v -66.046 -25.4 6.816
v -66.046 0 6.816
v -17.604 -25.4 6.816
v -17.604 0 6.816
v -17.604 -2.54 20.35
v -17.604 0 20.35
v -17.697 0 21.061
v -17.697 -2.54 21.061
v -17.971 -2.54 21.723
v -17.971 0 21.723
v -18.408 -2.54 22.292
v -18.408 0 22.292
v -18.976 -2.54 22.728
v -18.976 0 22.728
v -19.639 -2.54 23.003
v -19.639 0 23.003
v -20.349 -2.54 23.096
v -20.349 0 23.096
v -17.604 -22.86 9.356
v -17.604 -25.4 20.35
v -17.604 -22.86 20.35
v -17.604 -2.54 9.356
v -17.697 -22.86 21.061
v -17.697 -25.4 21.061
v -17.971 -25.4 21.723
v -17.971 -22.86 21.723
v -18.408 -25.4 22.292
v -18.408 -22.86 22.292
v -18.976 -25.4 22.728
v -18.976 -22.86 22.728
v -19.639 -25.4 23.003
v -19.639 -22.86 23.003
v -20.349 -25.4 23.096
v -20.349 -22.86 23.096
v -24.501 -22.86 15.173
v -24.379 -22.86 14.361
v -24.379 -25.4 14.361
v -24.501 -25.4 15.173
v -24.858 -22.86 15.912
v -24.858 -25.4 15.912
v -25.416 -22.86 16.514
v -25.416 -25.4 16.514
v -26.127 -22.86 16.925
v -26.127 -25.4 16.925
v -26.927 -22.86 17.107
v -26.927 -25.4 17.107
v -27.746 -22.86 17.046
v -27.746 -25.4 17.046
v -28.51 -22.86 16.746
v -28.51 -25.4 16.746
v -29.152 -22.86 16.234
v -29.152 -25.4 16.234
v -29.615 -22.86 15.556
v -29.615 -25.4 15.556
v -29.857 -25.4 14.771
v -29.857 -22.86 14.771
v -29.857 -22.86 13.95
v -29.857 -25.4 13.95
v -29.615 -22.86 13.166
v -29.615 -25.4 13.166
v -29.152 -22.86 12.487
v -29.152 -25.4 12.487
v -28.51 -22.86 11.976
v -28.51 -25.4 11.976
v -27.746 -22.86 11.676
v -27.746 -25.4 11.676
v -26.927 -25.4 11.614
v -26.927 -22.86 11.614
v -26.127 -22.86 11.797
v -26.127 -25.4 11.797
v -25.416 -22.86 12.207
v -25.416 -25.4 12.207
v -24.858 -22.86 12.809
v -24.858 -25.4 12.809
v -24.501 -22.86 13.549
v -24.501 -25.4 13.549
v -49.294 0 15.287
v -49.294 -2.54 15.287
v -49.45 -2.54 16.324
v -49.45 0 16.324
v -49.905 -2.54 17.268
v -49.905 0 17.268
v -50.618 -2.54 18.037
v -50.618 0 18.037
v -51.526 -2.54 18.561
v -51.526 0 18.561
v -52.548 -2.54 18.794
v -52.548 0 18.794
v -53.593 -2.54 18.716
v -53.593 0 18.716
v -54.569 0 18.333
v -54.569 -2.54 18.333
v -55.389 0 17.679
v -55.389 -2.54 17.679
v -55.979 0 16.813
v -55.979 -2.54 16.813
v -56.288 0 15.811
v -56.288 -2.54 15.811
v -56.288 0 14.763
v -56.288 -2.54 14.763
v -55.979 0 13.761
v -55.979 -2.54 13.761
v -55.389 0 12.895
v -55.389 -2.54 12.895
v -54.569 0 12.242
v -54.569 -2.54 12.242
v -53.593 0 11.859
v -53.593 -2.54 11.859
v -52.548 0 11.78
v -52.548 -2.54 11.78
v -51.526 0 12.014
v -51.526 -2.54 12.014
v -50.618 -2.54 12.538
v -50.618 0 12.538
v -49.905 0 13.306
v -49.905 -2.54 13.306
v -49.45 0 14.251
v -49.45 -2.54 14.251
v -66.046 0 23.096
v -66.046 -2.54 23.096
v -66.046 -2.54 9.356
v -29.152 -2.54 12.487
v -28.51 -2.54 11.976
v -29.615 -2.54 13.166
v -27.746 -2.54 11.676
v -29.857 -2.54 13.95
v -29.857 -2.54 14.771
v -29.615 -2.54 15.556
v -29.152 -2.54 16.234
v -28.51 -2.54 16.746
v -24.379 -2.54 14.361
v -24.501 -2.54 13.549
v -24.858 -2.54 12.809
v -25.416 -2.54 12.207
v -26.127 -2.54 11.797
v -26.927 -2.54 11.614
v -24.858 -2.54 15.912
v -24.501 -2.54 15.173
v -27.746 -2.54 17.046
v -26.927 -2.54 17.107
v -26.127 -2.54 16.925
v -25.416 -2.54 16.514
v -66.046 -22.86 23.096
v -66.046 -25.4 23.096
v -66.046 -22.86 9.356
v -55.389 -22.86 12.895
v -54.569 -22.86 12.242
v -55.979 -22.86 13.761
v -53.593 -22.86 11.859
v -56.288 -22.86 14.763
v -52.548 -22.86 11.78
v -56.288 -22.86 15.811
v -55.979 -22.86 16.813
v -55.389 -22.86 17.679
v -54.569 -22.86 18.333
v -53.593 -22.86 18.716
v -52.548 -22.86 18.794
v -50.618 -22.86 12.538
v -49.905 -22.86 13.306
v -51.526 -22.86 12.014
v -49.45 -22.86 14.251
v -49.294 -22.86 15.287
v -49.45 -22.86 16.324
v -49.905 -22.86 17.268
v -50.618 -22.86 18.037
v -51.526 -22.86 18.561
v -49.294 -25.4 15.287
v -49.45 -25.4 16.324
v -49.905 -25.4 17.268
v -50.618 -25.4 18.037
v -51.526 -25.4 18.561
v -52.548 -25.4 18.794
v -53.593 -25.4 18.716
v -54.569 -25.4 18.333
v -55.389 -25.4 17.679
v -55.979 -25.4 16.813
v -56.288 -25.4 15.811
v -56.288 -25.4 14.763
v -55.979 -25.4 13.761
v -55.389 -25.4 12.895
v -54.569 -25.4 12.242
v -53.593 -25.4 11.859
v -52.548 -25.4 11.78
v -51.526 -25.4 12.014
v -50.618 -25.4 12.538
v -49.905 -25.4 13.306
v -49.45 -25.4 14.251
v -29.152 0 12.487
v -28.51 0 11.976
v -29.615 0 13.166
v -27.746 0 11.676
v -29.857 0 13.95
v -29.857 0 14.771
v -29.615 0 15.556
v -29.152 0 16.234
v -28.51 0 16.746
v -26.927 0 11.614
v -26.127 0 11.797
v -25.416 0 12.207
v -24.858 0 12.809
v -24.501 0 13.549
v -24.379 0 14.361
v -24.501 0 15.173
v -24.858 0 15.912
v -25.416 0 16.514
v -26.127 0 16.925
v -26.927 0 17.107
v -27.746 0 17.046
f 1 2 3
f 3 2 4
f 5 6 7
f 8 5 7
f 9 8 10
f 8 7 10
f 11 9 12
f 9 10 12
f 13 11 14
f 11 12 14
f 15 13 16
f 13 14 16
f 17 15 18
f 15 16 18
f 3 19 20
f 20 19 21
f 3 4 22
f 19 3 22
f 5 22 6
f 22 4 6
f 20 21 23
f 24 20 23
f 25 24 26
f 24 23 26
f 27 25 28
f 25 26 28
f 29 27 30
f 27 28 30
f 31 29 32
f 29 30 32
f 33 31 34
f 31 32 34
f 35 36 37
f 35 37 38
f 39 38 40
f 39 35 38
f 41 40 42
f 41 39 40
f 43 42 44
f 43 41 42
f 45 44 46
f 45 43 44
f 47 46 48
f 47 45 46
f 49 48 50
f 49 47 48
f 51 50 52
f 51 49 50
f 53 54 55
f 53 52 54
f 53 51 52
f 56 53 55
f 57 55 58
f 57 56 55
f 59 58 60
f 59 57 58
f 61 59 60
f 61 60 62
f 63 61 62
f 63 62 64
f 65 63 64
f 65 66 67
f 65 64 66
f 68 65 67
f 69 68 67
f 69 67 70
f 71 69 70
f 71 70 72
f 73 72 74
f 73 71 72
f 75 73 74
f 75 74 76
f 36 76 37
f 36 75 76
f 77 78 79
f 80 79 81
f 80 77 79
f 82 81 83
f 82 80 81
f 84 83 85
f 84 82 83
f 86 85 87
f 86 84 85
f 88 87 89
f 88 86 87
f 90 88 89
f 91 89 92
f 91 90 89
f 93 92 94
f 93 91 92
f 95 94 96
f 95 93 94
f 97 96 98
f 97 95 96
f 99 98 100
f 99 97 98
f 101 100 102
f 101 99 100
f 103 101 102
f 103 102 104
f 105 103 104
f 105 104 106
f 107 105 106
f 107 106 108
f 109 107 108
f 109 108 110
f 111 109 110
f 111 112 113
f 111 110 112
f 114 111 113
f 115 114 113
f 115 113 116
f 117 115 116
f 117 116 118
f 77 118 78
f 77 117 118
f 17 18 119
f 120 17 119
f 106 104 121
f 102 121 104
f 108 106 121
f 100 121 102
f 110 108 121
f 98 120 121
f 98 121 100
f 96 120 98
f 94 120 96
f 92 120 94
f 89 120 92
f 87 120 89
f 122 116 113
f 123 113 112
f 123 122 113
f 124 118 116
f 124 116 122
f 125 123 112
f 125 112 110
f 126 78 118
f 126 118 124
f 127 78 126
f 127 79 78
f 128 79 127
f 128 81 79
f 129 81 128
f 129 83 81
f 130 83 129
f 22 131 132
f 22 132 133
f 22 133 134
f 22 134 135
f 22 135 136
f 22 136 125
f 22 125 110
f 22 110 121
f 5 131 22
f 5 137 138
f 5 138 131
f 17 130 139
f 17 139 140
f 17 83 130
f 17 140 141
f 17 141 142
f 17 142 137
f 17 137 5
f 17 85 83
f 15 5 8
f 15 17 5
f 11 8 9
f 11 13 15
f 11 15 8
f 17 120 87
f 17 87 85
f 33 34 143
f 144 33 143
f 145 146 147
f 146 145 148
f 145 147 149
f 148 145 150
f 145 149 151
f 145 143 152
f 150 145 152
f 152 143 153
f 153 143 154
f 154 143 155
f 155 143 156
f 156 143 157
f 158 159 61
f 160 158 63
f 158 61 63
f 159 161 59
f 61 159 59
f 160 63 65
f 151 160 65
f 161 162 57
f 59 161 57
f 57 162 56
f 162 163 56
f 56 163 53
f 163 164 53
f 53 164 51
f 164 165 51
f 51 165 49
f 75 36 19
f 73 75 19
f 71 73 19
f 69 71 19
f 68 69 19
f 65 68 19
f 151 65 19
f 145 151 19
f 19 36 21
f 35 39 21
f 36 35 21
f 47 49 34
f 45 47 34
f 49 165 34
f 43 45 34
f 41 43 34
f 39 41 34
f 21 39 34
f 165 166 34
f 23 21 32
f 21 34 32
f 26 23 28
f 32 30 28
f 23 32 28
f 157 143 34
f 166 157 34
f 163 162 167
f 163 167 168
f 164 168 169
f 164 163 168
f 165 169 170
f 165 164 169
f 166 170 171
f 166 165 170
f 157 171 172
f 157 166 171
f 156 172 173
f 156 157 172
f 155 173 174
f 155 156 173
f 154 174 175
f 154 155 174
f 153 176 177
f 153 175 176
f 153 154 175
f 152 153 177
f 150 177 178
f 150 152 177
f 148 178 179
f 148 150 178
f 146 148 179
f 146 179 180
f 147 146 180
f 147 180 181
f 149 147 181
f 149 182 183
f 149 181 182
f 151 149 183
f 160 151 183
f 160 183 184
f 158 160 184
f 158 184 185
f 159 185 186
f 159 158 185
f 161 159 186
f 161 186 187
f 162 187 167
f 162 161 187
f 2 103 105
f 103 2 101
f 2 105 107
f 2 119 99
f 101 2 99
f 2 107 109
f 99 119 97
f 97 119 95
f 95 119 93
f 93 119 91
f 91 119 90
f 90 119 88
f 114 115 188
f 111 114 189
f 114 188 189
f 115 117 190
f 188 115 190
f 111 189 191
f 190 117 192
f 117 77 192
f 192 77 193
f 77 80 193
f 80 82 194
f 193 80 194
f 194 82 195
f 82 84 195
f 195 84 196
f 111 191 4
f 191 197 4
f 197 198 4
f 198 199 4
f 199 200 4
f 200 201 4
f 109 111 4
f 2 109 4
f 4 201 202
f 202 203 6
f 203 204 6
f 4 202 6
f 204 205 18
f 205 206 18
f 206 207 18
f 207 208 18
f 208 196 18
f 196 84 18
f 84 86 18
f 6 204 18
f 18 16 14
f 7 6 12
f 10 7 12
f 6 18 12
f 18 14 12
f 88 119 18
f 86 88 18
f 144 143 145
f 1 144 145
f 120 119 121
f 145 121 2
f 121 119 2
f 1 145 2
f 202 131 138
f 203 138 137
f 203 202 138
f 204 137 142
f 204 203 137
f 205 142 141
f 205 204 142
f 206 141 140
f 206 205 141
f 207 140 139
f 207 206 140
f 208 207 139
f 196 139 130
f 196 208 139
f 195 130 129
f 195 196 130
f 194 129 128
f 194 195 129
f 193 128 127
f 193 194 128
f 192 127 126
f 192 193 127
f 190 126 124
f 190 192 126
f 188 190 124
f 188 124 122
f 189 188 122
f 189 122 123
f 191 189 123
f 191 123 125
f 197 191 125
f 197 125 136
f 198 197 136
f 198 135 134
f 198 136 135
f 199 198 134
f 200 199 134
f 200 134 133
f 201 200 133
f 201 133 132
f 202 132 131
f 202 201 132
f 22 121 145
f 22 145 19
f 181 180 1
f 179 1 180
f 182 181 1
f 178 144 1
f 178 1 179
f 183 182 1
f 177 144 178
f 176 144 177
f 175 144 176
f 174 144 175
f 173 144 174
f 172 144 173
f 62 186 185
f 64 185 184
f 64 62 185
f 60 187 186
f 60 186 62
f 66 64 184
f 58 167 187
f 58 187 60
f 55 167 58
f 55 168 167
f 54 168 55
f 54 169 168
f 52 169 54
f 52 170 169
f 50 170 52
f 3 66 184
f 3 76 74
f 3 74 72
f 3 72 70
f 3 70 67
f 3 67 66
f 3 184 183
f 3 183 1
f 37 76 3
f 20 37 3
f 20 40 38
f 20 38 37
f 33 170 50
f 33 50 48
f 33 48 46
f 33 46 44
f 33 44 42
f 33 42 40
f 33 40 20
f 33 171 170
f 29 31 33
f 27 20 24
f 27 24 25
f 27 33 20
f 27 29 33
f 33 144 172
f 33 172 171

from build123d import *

# Parameters (mm, degrees)
F1_DEPTH = 25.4
F2_T     = -2.54
F3_R     = 2.754178
F3_R_2   = 3.516822
F4_DEPTH = 59.182


with BuildPart() as f1:
    # F0 (on Front) → F1 (new body)
    with BuildSketch(Plane.XZ):
        with BuildLine():
            Line((-66.046305, 23.096353), (-66.046305, 6.816403))
            Line((-66.046305, 6.816403), (-17.603524, 6.816403))
            Line((-17.603524, 6.816403), (-17.603524, 20.350474))
            ThreePointArc((-17.603524, 20.350474), (-18.407773, 22.292103), (-20.349403, 23.096353))
            Line((-20.349403, 23.096353), (-64.987443, 23.096353))
            Line((-64.987443, 23.096353), (-66.046305, 23.096353))
        make_face()
    extrude(amount=F1_DEPTH)

    # F2
    f2_openings = [f1.faces().sort_by_distance(p)[0] for p in [
        (-43.197854, -12.7, 23.096353),
        (-17.603524, -12.7, 13.583438),
        (-18.407773, -12.7, 22.292103),
        (-66.046305, -12.7, 14.956378),
    ]]
    offset(amount=F2_T, openings=f2_openings)

    # F3 (on Front) + F1_face (on face) → F4 (cut)
    with BuildSketch(Plane.XZ):
        with Locations((-27.133251, 14.36077)):
            Circle(F3_R)
        with Locations((-52.810572, 15.287271)):
            Circle(F3_R_2)
    with BuildSketch(Plane(origin=(-41.873451, -25.4, 14.940904), x_dir=(1, 0, 0), z_dir=(0, -1, 0))):
        with BuildLine():
            Line((-24.172854, 8.155449), (-24.172854, -8.124501))
            Line((-24.172854, -8.124501), (24.269927, -8.124501))
            Line((24.269927, -8.124501), (24.269927, 5.40957))
            ThreePointArc((24.269927, 5.40957), (23.465677, 7.3512), (21.524048, 8.155449))
            Line((21.524048, 8.155449), (-24.172854, 8.155449))
        make_face()
    extrude(amount=F4_DEPTH, mode=Mode.SUBTRACT)


solid = f1.part
